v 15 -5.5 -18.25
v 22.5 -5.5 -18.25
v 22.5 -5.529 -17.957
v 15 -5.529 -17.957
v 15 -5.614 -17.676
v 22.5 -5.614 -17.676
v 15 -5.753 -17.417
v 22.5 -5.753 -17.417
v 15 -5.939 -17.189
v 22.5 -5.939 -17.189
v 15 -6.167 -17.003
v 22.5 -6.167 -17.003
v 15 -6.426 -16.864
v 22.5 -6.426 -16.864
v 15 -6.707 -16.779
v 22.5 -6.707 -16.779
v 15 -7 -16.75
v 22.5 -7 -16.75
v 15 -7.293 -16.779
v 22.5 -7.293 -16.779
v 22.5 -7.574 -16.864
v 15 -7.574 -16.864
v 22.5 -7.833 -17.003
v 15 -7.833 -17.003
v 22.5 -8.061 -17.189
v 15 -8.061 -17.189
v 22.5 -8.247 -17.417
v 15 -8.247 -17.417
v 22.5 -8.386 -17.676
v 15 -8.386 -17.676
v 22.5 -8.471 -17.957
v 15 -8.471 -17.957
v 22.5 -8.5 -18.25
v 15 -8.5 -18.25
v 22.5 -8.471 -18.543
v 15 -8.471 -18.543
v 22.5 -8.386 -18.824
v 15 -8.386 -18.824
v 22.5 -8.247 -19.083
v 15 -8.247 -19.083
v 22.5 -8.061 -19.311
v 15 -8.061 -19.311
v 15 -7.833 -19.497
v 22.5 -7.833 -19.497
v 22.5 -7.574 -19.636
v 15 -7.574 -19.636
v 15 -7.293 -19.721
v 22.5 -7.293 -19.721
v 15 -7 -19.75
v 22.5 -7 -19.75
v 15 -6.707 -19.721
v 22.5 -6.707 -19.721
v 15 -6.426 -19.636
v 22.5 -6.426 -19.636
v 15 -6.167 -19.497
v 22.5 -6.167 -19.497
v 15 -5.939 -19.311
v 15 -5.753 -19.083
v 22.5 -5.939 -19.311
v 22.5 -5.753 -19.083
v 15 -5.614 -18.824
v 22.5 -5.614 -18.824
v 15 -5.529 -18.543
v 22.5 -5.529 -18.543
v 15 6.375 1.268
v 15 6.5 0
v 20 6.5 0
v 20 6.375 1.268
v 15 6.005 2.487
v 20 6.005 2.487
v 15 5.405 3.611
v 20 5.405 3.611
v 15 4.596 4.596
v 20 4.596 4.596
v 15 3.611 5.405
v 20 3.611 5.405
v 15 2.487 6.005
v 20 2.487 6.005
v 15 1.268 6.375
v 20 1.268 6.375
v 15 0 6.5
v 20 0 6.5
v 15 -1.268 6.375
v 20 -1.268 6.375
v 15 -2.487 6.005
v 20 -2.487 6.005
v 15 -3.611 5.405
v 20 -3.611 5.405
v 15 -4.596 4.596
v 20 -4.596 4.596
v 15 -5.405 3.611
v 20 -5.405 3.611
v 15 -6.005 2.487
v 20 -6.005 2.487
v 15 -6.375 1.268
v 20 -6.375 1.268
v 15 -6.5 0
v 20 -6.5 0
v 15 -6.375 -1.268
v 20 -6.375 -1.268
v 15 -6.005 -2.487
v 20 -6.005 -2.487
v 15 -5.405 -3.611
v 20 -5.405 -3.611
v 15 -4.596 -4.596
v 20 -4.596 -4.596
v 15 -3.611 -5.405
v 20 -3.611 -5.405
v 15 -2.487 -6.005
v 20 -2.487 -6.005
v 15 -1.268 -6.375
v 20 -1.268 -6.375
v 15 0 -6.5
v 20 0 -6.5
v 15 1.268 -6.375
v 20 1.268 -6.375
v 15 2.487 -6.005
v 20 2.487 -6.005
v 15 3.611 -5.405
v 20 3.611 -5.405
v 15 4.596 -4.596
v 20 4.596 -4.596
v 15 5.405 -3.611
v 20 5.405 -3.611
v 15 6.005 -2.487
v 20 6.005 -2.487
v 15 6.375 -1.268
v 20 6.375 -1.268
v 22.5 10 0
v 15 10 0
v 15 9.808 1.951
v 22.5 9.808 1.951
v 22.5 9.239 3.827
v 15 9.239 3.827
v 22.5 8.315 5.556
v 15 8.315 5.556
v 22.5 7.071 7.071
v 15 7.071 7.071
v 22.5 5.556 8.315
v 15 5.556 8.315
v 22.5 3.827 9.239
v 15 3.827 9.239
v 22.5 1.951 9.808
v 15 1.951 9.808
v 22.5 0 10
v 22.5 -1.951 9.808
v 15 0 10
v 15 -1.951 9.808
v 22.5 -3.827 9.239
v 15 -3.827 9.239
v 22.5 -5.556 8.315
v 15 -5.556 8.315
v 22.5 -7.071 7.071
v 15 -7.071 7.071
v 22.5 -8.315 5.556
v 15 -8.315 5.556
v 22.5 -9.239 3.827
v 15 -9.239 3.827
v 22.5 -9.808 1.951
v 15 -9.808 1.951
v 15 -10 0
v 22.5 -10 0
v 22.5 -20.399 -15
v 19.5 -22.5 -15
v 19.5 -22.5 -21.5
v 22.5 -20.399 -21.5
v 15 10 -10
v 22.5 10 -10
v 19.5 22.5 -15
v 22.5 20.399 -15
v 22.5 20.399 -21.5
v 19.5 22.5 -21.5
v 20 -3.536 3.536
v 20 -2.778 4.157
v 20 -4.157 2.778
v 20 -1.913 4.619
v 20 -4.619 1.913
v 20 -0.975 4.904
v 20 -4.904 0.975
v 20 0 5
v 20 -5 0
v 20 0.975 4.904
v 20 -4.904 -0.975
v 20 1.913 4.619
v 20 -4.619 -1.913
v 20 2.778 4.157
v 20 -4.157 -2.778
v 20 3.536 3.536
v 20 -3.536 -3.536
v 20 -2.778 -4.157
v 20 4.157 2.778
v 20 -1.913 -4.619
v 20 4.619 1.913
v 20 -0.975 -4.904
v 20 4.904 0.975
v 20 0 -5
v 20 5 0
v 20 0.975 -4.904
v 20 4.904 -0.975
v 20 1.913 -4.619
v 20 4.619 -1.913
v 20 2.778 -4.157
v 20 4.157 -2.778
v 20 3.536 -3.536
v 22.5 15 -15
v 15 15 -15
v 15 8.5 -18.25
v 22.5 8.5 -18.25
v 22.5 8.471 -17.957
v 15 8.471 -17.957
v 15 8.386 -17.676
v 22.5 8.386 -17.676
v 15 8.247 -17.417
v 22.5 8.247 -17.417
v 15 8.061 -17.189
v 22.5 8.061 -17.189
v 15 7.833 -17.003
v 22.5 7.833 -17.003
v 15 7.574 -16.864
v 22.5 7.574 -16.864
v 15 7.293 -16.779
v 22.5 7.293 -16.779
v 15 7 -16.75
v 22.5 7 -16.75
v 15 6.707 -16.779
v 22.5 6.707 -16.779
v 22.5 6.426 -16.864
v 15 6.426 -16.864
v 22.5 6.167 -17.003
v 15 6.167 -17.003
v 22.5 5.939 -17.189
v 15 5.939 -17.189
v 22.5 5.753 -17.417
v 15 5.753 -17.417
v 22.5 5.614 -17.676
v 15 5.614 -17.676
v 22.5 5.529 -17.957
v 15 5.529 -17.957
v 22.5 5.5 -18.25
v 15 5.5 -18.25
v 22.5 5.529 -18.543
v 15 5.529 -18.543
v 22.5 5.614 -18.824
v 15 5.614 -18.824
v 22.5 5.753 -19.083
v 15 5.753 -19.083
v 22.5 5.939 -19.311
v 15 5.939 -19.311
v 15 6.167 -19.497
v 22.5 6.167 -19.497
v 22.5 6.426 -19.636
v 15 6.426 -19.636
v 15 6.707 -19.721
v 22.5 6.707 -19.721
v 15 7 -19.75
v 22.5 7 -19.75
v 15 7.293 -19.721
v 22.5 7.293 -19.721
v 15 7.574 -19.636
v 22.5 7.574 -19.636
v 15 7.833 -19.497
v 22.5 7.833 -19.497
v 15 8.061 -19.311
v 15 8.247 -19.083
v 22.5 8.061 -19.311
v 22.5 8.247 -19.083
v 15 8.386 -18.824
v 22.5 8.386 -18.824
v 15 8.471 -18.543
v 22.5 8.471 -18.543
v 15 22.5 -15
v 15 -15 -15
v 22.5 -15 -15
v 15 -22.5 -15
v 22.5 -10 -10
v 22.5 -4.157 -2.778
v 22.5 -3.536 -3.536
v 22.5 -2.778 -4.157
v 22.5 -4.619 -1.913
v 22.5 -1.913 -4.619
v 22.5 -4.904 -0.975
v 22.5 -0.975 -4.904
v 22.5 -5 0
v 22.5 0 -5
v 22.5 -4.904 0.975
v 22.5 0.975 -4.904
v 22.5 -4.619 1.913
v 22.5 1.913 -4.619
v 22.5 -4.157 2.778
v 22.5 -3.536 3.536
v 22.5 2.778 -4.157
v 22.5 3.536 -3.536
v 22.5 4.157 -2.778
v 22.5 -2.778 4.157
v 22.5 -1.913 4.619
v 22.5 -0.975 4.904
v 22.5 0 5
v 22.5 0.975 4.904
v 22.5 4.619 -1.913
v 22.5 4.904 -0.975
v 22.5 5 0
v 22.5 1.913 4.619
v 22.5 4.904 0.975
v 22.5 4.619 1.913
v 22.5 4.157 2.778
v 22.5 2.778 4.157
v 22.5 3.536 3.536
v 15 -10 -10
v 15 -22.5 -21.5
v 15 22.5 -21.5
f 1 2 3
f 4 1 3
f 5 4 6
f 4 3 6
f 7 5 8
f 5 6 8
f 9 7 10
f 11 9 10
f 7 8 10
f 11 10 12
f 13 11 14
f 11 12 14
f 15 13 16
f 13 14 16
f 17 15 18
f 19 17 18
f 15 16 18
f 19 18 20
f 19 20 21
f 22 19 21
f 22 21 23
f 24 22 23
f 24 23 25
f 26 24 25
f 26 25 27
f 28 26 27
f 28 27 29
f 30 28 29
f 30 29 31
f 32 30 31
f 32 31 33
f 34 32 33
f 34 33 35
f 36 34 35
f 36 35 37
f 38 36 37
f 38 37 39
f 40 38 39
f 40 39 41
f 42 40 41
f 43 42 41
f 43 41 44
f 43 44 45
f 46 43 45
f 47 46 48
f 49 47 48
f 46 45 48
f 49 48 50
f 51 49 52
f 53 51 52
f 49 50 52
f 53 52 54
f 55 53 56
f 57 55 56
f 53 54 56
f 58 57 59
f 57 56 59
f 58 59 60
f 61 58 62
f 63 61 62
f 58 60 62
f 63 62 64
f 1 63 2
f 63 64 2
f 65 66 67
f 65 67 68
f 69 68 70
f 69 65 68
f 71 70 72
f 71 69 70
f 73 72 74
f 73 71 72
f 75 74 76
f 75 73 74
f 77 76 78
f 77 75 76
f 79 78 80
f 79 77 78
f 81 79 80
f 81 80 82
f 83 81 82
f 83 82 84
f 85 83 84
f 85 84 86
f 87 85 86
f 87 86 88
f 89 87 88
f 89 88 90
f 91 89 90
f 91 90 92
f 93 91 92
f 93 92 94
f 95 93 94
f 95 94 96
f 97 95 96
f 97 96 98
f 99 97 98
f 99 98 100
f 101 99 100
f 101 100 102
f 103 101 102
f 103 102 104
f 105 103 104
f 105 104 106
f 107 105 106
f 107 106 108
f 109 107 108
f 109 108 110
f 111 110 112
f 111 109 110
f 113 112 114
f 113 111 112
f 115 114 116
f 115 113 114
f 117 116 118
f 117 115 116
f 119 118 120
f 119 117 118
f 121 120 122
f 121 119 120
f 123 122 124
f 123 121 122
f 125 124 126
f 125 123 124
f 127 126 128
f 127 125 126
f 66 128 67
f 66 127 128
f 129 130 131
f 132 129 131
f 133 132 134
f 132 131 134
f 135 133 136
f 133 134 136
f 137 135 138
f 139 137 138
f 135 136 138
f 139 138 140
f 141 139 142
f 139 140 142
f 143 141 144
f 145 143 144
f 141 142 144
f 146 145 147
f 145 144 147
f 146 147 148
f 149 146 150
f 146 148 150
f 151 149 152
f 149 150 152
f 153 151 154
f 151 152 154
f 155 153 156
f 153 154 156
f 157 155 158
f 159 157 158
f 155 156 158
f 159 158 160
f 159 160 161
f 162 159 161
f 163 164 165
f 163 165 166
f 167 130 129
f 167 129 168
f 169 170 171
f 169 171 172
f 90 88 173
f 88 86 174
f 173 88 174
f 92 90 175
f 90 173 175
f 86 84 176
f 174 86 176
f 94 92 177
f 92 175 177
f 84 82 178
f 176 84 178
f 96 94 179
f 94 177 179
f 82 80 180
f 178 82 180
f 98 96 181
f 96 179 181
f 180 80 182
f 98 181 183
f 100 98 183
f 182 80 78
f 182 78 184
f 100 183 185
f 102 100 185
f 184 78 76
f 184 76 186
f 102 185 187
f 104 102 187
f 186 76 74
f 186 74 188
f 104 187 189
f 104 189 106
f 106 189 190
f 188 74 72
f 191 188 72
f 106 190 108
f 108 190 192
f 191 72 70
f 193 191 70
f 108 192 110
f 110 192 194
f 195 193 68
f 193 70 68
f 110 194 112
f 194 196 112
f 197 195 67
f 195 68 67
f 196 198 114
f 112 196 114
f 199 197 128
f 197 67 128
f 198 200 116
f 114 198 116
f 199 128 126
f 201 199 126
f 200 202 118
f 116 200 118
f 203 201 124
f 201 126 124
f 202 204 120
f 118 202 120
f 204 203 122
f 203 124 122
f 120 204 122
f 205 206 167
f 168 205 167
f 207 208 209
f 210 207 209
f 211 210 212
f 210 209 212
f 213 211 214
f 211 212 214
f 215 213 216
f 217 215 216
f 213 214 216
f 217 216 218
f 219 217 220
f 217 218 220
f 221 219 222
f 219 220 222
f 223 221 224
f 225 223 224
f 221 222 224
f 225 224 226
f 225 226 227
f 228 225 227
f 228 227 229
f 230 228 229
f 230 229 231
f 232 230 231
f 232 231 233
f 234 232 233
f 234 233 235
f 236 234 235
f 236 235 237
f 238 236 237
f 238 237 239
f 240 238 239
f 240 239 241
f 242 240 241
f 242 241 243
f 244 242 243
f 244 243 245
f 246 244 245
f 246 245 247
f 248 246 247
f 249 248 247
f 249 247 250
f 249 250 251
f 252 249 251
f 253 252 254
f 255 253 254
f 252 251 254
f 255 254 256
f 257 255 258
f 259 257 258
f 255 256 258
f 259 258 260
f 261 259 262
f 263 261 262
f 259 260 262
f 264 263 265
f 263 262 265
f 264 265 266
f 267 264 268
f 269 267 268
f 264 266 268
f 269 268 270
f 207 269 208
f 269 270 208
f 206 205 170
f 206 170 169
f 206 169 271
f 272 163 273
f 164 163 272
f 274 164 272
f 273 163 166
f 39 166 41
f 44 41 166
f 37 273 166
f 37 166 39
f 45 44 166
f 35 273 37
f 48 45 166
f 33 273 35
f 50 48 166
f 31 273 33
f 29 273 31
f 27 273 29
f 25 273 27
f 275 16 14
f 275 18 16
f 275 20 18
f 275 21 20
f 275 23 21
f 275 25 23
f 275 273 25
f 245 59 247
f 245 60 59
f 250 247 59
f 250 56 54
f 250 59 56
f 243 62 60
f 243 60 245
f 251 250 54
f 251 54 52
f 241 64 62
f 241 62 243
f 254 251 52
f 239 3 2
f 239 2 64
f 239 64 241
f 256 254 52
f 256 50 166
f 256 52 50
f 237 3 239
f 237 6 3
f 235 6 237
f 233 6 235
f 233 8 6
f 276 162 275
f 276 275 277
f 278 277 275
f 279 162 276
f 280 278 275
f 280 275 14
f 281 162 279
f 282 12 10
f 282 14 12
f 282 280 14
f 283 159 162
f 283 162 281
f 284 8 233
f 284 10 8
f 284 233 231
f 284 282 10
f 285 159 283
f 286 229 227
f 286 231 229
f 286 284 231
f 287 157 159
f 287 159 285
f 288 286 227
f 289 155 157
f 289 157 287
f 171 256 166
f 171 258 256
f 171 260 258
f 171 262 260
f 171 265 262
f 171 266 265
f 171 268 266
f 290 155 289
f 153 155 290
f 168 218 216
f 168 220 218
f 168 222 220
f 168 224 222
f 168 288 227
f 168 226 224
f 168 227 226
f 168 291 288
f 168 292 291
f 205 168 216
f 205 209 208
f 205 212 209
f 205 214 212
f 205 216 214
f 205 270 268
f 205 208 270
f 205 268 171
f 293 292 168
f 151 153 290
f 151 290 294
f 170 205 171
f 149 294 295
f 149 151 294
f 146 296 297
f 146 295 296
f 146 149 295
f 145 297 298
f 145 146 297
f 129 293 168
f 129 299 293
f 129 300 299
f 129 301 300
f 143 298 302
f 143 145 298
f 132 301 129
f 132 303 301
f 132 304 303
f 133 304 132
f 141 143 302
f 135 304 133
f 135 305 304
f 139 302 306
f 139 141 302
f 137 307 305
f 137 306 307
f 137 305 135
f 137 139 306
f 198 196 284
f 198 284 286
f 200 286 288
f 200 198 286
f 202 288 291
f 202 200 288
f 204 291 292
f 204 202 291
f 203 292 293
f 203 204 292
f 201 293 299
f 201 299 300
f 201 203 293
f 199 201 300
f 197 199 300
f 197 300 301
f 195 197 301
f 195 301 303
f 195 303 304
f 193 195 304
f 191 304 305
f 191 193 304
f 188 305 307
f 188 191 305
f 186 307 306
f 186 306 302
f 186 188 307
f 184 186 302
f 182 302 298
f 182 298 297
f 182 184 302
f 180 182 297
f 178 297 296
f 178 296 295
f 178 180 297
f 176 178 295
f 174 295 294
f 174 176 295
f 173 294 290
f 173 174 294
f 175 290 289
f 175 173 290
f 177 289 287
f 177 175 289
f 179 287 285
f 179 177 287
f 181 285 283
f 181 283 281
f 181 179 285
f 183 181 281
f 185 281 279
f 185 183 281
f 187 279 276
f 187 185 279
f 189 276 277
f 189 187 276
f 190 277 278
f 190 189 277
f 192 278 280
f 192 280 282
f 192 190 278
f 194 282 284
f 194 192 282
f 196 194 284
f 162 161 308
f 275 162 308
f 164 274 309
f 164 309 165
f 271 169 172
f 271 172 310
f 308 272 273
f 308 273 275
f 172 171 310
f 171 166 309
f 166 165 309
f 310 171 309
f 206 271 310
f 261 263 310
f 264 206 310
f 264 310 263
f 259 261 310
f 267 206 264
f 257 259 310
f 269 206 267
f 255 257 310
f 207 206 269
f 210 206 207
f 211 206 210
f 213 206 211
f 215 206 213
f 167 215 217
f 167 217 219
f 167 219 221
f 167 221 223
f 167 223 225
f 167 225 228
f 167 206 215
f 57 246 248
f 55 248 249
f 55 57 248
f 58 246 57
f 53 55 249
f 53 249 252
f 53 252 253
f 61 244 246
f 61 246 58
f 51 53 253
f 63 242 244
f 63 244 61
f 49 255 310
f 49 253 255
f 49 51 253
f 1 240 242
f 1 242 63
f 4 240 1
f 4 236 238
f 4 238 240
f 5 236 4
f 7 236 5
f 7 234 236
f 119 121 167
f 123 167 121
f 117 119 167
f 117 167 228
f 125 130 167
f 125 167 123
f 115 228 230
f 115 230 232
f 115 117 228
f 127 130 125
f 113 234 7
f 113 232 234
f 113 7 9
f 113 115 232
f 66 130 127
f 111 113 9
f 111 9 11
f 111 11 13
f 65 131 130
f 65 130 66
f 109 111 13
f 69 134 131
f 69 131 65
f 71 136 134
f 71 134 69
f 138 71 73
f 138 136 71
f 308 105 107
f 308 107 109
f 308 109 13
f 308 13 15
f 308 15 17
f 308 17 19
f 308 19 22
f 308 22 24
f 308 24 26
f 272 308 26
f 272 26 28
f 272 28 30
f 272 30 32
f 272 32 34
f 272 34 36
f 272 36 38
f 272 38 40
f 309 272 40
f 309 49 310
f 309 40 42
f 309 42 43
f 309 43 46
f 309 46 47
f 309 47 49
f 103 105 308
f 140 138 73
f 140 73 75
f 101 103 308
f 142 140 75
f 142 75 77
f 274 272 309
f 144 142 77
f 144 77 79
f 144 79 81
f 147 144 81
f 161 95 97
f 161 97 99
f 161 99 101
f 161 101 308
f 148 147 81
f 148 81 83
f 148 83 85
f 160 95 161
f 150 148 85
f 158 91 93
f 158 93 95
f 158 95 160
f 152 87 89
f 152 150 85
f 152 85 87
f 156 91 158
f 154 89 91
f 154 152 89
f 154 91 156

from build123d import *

# Parameters (mm, degrees)
SKETCH_R         = 6.5
EXTRUDE_DEPTH    = 7.5
TUBE002_R        = 6.5
TUBE002_R_2      = 5
TUBE002_DEPTH    = 2.5
SKETCH023_R      = 1.5
EXTRUDE015_DEPTH = 100
EXTRUDE008_DEPTH = 6.5


with BuildPart() as extrude_body:
    # Sketch (on Tube) → Extrude (new body)
    with BuildSketch(Plane.YZ):
        with BuildLine():
            ThreePointArc((10, 0), (0, 10), (-10, 0))
            Line((-10, 0), (-10, -10))
            Line((-15, -15), (-10, -10))
            Line((-15, -15), (15, -15))
            Line((15, -15), (10, -10))
            Line((10, 0), (10, -10))
        make_face()
        Circle(SKETCH_R, mode=Mode.SUBTRACT)
    extrude(amount=EXTRUDE_DEPTH)


with BuildPart() as extrude_body_1:
    # Extrude placement: moved
    add(extrude_body.part.moved(Location((15, 0, 0))))


with BuildPart() as fusion002:
    # Tube002 → Tube002 (new body)
    with BuildSketch(Plane(origin=(20, 0, 0), x_dir=(0, 0, -1), z_dir=(1, 0, 0))):
        Circle(TUBE002_R)
        Circle(TUBE002_R_2, mode=Mode.SUBTRACT)
    extrude(amount=TUBE002_DEPTH)

    # Fusion002: union Extrude body
    add(extrude_body_1.part)


with BuildPart() as extrude015:
    # Sketch023 → Extrude015 (new body)
    with BuildSketch(Plane.YZ.offset(34.5)):
        with Locations((-7, -18.25)):
            Circle(SKETCH023_R)
        with Locations((7, -18.25)):
            Circle(SKETCH023_R)
    extrude(amount=-EXTRUDE015_DEPTH)


with BuildPart() as extrude008:
    # Sketch015 (on Face7 of Fusion001) → Extrude008 (new body)
    with BuildSketch(Plane(origin=(0, 0, -15), x_dir=(1, 0, 0), z_dir=(0, 0, -1))):
        Polygon((-22.5, 20.399377), (-22.5, -20.399377), (-19.5, -22.5), (-15, -22.5), (-15, 22.5), (-19.5, 22.5), align=None)
    extrude(amount=EXTRUDE008_DEPTH)


with BuildPart() as fusion006:
    # Part__Mirroring: instance of Extrude008
    add(extrude008.part.mirror(Plane(origin=(0, 0, 0), x_dir=(0, -1, 0), z_dir=(1, 0, 0))))

    # Cut004: cut Extrude015
    add(extrude015.part, mode=Mode.SUBTRACT)

    # Fusion006: union Fusion002
    add(fusion002.part)


solid = fusion006.part
